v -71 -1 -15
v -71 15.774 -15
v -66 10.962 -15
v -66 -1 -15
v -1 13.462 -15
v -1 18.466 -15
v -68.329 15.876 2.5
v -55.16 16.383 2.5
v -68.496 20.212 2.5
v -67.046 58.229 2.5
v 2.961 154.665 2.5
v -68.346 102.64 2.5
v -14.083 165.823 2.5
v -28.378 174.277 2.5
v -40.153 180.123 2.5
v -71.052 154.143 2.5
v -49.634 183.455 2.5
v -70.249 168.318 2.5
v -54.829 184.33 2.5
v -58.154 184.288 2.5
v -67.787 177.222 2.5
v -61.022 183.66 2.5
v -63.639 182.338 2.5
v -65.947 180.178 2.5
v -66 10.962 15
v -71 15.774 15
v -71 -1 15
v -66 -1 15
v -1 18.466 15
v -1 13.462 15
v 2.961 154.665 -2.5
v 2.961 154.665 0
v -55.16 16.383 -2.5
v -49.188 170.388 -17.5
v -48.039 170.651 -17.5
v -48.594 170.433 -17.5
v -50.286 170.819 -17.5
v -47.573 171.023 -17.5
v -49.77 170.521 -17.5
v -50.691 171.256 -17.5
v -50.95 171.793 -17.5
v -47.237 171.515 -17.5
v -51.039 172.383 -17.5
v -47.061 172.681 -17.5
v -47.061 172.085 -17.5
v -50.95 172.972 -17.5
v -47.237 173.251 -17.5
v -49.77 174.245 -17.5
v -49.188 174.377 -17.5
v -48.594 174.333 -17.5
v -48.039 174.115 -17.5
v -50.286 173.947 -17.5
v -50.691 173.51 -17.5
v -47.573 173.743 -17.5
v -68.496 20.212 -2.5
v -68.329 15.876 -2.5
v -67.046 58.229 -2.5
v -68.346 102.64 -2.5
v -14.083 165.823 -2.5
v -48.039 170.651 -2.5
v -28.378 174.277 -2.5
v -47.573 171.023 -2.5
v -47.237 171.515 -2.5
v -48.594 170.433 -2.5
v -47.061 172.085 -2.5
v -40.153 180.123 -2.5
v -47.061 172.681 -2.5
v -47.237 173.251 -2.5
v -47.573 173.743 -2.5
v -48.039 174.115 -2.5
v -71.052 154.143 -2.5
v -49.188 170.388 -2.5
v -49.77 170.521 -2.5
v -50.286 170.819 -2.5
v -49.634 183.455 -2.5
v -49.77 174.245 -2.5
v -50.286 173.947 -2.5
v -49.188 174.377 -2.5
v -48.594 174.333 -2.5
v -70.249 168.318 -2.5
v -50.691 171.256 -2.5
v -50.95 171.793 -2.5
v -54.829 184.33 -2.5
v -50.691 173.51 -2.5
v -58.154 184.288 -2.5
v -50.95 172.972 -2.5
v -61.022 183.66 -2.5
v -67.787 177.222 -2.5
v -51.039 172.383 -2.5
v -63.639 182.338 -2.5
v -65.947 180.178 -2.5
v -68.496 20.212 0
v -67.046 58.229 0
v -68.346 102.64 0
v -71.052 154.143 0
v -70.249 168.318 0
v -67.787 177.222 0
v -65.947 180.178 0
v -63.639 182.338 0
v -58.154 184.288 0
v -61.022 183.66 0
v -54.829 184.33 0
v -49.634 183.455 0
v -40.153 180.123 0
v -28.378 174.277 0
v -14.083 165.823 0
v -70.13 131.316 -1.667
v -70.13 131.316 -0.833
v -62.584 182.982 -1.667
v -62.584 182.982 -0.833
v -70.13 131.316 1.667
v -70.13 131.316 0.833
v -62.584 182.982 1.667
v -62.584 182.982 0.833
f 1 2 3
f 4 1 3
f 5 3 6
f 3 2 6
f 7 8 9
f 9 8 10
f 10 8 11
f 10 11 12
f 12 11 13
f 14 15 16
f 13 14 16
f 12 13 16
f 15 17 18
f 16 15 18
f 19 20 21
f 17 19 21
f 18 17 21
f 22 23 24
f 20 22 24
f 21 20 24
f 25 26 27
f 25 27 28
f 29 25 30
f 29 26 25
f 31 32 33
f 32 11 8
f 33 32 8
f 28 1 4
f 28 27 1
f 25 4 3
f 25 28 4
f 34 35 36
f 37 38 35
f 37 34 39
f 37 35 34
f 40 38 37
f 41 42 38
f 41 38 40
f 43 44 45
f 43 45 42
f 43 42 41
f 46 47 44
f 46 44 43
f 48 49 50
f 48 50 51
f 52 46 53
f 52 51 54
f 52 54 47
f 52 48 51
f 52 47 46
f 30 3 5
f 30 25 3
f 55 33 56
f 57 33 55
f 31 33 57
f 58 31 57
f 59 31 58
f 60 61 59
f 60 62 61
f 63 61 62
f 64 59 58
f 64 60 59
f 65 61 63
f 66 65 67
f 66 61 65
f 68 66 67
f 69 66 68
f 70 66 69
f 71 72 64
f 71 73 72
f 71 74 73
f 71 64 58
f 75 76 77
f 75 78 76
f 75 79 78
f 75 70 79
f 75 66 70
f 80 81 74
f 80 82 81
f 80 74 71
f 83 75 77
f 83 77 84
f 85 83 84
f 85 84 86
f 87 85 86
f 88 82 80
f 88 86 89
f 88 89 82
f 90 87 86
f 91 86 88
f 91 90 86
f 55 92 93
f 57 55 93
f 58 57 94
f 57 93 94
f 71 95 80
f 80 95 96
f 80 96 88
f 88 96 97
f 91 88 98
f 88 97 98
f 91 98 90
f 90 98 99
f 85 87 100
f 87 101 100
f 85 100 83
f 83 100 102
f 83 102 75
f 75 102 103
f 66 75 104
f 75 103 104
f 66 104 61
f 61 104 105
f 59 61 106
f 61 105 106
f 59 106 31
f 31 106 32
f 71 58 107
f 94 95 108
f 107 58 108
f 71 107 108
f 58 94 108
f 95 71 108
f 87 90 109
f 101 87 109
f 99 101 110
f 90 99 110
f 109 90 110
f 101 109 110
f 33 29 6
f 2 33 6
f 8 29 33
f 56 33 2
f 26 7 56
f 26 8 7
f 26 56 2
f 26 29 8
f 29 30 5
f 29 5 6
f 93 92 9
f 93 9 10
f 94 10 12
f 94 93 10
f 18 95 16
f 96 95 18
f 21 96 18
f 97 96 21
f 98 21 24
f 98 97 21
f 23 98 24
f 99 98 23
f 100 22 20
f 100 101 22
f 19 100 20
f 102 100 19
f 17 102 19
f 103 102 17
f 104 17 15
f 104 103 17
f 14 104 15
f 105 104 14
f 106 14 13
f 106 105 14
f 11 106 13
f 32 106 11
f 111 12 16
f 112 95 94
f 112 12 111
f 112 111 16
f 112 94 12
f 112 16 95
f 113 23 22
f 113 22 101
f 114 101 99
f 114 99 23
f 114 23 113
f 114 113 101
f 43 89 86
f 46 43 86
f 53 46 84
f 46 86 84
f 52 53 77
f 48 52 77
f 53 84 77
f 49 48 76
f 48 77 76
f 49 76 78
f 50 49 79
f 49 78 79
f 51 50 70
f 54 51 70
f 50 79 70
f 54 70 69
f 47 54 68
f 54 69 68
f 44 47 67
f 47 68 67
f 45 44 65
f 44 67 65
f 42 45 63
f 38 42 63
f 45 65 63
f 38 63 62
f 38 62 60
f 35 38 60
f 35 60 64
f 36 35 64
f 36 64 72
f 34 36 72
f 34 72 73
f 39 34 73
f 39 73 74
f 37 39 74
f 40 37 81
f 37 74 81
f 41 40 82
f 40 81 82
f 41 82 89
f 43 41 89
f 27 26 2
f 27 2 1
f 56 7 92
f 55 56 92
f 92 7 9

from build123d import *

# Parameters (mm, degrees)
BOSS_EXTRUDE1_DEPTH = 15
BOSS_EXTRUDE2_DEPTH = 2.5
SKETCH3_R           = 2
BOSS_EXTRUDE3_DEPTH = 15


with BuildPart() as part:
    # Sketch1 → Boss-Extrude1 (new, symmetric)
    with BuildSketch(Plane.XY):
        Polygon((-66, 10.962277833), (-1, 13.462277833), (-1, 18.465974691), (-71, 15.773666999), (-71, -1), (-66, -1), align=None)
    extrude(amount=BOSS_EXTRUDE1_DEPTH, both=True)

    # Sketch2 → Boss-Extrude2 (add, symmetric)
    with BuildSketch(Plane.XY):
        with BuildLine():
            Line((-68.329320747, 15.876385432), (-68.49608066, 20.212143147))
            add(Edge.make_bspline(
                [(-68.49608066, 20.212143147), (-58.446239367, 154.187541724), (-107.856515034, 229.820456607), (2.961147934, 154.665009331)],
                knots=[0, 0, 0, 0, 1, 1, 1, 1], degree=3))
            Line((2.961147934, 154.665009331), (-55.159919487, 16.382900865))
            Line((-55.159919487, 16.382900865), (-68.329320747, 15.876385432))
        make_face()
    extrude(amount=BOSS_EXTRUDE2_DEPTH, both=True)

    # Sketch3 → Boss-Extrude3 (add)
    with BuildSketch(Plane(origin=(0, 0, -2.5), x_dir=(-1, 0, 0), z_dir=(0, 0, -1))):
        with Locations((49.038852066, 172.382900865)):
            Circle(SKETCH3_R)
    extrude(amount=BOSS_EXTRUDE3_DEPTH)


solid = part.part
